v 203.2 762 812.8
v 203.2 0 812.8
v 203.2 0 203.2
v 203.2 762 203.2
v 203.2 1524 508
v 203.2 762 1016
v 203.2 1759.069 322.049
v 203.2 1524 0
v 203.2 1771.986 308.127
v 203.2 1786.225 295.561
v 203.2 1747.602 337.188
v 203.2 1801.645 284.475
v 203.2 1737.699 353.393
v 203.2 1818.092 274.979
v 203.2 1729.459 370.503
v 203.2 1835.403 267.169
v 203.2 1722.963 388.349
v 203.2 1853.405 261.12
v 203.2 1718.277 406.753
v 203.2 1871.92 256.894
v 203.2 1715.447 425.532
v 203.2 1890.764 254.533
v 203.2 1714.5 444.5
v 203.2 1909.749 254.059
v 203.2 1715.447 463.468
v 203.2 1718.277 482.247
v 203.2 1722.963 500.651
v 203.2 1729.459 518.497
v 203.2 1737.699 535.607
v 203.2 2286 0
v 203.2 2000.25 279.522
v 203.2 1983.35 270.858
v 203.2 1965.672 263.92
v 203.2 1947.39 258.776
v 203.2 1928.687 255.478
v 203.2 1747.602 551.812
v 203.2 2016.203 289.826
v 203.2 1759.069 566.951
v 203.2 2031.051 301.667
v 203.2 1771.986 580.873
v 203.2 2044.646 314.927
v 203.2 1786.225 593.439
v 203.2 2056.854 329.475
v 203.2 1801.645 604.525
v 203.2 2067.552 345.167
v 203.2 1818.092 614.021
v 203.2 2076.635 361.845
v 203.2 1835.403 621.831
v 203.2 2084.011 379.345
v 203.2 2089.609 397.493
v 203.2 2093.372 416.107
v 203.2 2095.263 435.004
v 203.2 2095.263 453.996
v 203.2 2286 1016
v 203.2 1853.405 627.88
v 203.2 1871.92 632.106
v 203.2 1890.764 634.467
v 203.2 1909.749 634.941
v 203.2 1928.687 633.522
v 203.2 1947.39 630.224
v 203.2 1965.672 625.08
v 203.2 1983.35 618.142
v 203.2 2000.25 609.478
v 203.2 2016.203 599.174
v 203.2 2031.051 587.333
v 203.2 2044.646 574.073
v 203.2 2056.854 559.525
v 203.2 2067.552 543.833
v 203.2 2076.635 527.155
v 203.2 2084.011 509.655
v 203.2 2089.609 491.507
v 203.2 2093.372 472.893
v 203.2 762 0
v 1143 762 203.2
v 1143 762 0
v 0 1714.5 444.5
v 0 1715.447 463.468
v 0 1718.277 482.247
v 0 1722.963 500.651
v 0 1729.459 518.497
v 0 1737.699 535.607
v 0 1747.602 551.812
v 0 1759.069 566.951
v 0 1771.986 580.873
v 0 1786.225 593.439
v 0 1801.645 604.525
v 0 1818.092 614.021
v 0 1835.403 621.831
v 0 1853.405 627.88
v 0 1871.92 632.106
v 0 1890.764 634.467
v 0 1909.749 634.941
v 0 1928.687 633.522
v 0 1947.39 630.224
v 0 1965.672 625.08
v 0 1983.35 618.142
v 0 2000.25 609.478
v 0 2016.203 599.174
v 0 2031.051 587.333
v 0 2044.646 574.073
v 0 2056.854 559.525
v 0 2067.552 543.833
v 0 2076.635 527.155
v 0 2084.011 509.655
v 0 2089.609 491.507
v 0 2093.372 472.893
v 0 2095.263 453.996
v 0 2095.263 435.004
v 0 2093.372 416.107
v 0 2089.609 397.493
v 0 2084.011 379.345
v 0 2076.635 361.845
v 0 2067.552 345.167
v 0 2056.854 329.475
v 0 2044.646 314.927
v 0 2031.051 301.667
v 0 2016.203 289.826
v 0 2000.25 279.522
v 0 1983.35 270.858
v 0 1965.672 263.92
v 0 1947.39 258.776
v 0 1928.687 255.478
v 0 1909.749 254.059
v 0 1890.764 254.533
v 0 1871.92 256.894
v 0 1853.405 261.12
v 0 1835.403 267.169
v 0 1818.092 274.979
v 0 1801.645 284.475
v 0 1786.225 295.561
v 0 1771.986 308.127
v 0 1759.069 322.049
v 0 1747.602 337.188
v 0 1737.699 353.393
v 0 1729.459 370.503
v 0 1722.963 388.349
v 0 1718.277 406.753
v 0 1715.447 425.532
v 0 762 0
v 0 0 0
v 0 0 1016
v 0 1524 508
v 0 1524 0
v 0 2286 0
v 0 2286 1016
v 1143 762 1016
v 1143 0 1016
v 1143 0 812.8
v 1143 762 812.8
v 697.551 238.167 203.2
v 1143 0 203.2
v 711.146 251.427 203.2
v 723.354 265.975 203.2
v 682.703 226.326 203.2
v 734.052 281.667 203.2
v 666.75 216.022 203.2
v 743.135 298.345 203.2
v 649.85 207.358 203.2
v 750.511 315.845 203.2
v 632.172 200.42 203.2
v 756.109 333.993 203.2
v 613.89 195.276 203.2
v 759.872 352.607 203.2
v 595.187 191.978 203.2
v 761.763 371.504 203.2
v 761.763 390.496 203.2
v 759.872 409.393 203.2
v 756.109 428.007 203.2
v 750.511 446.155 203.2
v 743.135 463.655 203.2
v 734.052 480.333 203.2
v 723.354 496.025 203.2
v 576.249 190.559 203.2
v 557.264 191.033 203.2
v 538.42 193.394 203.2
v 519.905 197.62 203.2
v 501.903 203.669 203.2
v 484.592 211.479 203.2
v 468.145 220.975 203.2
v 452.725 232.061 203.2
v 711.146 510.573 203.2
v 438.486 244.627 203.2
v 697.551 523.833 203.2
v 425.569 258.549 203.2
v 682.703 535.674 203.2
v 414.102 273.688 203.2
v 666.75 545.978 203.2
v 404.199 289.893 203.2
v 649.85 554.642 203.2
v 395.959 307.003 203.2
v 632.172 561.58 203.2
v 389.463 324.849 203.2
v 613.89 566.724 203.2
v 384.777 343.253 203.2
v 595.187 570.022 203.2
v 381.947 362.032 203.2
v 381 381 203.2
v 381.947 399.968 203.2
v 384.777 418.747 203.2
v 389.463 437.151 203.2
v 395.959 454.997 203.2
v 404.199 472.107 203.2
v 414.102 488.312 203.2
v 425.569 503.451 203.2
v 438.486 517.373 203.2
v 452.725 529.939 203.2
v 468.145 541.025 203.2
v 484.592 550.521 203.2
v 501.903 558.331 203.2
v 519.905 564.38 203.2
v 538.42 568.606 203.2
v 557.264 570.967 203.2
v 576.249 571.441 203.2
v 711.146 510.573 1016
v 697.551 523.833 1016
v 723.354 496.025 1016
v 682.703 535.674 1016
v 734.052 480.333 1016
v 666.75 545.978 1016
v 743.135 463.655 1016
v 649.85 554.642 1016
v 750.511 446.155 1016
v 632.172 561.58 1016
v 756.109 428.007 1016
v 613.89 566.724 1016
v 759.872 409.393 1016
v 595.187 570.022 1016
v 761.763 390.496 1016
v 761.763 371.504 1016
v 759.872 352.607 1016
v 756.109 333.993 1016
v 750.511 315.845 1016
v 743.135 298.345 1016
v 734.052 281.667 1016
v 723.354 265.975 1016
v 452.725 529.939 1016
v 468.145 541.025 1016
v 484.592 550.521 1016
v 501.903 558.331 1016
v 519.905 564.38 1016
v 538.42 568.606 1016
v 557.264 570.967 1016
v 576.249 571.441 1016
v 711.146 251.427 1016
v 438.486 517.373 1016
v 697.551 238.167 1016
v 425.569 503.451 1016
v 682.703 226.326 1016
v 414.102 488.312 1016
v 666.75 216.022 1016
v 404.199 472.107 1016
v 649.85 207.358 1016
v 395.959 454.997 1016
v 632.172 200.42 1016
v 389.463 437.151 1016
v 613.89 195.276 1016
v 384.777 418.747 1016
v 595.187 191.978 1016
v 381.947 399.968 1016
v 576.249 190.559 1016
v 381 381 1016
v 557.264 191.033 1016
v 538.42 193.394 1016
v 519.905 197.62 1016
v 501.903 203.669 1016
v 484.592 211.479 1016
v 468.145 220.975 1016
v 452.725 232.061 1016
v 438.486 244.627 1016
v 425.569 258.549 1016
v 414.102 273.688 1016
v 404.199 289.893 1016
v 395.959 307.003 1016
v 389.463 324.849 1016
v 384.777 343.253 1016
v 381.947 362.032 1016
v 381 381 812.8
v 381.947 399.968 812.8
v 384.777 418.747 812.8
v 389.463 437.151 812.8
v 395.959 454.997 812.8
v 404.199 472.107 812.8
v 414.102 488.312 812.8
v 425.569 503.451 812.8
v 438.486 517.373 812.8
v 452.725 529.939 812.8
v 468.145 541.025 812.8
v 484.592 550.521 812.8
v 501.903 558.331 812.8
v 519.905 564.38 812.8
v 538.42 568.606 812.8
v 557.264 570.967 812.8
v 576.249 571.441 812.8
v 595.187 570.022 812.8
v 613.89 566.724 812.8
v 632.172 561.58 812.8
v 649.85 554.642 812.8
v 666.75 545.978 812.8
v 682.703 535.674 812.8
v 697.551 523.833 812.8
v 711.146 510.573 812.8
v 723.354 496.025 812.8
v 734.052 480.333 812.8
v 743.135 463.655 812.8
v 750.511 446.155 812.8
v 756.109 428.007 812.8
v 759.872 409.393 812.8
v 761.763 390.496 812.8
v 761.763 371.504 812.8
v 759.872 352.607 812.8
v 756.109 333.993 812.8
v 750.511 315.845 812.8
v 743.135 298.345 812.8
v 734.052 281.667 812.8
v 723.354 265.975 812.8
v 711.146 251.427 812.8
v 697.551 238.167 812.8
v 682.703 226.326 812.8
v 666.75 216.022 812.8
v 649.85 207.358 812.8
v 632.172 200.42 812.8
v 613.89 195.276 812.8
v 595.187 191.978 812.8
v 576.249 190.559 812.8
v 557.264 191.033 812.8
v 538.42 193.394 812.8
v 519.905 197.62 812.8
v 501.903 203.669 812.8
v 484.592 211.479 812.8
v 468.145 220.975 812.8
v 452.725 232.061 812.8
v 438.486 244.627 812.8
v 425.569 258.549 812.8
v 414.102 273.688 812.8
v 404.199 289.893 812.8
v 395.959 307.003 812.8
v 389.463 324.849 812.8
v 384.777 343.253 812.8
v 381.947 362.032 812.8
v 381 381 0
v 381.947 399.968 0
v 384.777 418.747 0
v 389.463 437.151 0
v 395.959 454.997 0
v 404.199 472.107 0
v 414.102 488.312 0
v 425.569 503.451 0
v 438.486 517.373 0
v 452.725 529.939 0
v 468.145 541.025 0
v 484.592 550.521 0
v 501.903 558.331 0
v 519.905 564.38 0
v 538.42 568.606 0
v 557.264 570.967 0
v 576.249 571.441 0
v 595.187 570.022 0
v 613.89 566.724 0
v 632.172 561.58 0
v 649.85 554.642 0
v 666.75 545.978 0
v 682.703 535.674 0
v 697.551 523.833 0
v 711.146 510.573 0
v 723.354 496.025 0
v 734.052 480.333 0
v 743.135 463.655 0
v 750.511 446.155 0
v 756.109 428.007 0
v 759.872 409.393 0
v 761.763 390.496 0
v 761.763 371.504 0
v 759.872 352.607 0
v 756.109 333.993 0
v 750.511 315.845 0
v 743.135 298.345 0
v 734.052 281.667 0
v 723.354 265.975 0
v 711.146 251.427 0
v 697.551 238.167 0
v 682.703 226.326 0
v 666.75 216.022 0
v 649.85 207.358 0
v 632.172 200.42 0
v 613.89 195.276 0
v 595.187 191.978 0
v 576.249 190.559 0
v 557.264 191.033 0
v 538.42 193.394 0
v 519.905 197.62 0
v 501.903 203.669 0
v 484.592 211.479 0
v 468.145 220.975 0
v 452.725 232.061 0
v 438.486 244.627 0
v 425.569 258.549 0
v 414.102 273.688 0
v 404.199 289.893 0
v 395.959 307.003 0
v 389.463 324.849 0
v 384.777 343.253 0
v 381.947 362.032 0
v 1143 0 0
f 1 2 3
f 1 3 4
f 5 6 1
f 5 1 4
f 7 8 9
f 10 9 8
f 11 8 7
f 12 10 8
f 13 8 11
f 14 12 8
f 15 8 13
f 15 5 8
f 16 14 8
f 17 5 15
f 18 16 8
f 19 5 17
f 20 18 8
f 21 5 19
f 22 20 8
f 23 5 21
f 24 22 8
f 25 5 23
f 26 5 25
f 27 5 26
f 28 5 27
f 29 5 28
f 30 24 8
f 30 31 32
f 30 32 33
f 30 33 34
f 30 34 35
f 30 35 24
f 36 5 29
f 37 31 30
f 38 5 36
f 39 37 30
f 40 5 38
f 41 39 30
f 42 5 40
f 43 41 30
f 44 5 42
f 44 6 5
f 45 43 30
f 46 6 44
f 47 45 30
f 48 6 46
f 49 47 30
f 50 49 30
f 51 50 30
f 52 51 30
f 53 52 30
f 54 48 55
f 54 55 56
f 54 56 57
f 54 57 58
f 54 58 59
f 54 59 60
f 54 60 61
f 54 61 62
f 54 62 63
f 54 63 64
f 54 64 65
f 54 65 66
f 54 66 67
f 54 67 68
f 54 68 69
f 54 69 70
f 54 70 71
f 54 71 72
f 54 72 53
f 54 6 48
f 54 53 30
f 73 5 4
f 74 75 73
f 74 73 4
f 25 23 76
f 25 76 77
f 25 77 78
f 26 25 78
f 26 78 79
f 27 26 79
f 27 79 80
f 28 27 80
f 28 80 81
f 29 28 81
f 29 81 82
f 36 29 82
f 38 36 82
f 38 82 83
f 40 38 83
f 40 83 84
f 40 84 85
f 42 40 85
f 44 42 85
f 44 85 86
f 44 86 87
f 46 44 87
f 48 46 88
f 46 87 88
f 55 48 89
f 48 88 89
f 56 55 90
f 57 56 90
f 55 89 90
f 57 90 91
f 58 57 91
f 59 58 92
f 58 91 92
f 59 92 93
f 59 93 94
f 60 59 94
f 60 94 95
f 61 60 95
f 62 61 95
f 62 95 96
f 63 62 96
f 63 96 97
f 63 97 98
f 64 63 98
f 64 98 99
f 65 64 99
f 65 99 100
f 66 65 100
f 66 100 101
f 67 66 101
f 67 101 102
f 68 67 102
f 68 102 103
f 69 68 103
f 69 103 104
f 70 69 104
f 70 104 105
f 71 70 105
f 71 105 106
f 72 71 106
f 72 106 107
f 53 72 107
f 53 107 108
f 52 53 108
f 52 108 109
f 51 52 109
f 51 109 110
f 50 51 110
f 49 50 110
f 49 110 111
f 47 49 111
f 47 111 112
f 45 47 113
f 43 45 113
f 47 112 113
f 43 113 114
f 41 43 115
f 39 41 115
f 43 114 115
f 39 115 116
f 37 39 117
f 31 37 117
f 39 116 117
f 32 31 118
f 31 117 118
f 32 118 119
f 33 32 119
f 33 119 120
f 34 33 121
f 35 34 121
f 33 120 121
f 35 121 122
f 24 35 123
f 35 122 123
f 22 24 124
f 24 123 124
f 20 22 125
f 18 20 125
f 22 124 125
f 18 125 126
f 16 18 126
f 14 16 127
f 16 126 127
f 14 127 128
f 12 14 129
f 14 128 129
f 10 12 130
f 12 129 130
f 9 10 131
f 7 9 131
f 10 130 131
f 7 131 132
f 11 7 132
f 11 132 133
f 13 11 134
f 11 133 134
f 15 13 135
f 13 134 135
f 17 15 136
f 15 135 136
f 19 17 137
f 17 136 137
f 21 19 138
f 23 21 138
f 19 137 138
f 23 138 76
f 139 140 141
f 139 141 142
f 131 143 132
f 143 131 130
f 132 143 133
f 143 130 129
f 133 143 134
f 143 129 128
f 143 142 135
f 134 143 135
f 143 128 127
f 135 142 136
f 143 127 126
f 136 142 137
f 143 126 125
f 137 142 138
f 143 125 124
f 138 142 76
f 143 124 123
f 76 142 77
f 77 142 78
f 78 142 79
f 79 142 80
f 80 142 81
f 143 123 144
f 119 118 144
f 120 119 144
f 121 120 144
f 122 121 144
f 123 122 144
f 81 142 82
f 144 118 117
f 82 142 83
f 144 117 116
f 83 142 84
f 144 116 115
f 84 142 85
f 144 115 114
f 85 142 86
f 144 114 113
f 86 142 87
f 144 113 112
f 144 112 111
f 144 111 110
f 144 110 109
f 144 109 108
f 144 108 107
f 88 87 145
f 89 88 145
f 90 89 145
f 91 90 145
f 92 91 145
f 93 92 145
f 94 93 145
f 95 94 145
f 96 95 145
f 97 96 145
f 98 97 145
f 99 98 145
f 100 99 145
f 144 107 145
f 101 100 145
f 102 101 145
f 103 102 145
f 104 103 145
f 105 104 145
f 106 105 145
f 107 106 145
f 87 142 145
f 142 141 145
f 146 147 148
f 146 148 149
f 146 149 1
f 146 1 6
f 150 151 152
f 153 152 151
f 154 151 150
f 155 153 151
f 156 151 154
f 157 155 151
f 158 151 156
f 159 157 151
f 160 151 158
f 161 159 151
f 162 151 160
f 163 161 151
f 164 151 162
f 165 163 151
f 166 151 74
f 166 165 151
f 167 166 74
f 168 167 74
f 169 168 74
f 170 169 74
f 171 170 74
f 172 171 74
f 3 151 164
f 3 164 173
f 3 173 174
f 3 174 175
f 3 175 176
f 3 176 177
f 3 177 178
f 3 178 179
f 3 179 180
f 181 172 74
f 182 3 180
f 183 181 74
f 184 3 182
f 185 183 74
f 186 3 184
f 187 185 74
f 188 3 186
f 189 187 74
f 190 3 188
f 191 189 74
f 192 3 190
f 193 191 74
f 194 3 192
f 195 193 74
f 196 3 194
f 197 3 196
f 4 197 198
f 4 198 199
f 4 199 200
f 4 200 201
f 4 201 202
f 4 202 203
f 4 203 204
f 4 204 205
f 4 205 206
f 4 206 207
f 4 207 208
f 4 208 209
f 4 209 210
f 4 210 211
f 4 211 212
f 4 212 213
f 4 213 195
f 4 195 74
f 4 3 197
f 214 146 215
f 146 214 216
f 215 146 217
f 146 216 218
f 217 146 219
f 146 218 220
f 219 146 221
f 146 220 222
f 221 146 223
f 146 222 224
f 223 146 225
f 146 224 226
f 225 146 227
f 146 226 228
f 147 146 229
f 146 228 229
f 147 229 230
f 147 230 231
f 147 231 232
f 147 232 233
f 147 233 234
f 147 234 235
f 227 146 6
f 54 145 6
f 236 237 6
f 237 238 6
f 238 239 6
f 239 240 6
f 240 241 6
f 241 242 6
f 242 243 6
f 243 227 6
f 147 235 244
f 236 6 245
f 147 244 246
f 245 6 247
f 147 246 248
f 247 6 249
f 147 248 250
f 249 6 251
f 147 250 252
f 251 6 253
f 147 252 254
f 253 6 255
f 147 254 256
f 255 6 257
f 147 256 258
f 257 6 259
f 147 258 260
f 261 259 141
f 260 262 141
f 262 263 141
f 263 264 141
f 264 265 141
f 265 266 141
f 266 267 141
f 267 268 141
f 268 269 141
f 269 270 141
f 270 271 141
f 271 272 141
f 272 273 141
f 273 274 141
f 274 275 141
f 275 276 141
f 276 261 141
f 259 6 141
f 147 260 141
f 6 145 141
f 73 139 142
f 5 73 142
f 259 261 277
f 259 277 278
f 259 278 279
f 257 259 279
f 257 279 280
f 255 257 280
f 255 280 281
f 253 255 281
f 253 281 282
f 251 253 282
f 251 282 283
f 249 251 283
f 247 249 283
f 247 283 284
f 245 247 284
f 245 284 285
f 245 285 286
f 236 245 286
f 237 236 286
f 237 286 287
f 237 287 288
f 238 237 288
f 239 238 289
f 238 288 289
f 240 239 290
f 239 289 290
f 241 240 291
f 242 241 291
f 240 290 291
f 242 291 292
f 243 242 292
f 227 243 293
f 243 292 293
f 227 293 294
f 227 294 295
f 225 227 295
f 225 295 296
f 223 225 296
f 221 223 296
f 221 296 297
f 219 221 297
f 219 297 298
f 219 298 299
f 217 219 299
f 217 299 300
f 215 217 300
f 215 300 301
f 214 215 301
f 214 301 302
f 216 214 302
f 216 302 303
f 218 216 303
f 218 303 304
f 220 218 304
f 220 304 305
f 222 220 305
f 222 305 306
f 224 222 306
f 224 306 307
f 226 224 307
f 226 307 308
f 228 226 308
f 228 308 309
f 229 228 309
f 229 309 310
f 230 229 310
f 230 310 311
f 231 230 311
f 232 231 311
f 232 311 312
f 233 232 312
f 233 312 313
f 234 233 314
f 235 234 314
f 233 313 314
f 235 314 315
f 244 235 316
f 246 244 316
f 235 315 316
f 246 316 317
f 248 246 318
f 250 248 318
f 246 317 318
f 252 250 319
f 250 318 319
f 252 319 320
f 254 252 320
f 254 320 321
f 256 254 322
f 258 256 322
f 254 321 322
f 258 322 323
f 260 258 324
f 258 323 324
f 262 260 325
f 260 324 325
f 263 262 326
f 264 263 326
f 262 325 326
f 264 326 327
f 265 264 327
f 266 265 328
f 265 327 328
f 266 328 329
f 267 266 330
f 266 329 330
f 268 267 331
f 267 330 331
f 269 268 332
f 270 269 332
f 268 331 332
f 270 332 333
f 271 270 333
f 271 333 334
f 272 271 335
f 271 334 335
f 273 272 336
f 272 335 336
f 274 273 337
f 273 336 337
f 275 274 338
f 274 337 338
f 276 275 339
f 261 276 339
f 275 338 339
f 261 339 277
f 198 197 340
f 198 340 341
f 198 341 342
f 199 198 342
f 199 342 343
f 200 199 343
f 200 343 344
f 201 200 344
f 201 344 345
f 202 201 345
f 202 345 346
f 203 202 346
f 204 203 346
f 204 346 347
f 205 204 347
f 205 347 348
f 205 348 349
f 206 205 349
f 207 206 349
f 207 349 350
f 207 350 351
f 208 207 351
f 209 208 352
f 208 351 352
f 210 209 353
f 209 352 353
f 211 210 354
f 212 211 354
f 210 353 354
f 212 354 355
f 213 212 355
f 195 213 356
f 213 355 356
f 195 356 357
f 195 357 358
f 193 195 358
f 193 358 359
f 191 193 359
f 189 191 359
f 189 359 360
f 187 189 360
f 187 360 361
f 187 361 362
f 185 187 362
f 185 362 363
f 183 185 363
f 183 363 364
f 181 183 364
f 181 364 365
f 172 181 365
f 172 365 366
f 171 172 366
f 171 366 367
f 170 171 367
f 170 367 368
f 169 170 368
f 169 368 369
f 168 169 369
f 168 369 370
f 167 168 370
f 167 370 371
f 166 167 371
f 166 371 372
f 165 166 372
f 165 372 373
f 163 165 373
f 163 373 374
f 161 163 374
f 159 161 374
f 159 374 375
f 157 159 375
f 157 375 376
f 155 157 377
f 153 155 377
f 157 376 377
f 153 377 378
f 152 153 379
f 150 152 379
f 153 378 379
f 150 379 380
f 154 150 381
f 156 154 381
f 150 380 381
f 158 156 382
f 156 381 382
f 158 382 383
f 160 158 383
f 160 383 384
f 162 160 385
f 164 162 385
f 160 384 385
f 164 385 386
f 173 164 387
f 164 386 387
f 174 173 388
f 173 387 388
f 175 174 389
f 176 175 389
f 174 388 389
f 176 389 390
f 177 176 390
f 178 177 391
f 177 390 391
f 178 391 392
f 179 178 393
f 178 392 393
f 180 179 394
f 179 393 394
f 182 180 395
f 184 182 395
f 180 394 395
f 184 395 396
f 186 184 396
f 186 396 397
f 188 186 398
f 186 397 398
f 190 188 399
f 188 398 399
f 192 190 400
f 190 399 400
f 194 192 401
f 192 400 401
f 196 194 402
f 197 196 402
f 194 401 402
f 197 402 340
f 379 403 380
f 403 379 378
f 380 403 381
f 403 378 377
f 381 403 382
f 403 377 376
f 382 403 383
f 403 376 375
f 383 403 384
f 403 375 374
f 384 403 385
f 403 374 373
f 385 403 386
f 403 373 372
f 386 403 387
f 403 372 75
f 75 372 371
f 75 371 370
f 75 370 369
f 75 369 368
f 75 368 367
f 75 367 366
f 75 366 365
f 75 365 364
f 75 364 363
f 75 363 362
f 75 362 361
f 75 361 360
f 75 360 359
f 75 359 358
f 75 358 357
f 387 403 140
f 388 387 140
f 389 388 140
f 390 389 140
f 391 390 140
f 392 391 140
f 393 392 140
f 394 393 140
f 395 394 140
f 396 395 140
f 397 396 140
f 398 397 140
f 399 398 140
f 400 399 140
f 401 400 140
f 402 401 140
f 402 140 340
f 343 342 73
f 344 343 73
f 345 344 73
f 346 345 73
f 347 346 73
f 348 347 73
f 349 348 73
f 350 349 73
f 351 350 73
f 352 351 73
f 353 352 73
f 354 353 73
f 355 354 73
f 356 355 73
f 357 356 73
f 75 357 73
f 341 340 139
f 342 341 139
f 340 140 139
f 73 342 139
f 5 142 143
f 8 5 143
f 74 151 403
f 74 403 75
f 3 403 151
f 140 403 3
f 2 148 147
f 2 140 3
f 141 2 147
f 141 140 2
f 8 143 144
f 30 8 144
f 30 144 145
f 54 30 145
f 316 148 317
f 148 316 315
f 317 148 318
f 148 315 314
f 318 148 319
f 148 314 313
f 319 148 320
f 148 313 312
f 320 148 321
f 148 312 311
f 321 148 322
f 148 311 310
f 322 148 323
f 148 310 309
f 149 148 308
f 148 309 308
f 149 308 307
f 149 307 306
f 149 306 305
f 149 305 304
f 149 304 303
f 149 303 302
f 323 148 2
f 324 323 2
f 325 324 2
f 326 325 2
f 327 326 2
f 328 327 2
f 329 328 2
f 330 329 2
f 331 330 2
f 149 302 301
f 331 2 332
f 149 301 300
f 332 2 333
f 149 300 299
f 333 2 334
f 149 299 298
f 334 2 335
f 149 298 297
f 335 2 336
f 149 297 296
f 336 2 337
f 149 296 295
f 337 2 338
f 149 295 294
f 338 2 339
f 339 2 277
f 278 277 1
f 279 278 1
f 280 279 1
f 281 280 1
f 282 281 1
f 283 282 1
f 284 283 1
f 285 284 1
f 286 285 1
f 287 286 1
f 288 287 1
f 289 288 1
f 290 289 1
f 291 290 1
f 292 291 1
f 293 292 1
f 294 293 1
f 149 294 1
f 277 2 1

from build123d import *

# Parameters (mm, degrees)
F1_DEPTH = 203.2
F2_W     = 762
F2_H     = 203.2
F3_DEPTH = 939.8
F5_D     = 381
F7_D     = 381


with BuildPart() as f1:
    # F0 (on Right) → F1 (new body)
    with BuildSketch(Plane.YZ):
        Polygon((0, 1016), (0, 0), (762, 0), (1524, 508), (1524, 0), (2286, 0), (2286, 1016), align=None)
    extrude(amount=F1_DEPTH)

    # F2 (on face) → F3 (join)
    with BuildSketch(Plane.YZ.offset(203.2)):
        with Locations((381, 101.6)):
            Rectangle(F2_W, F2_H)
        with Locations((381, 914.4)):
            Rectangle(F2_W, F2_H)
    extrude(amount=F3_DEPTH)

    # F5 (through all)
    with Locations(Plane.XY.offset(1016)):
        with Locations((571.5, 381)):
            Hole(F5_D / 2)

    # F7 (through all)
    with Locations(Plane.YZ.offset(203.2)):
        with Locations((1905, 444.5)):
            Hole(F7_D / 2)


solid = f1.part
